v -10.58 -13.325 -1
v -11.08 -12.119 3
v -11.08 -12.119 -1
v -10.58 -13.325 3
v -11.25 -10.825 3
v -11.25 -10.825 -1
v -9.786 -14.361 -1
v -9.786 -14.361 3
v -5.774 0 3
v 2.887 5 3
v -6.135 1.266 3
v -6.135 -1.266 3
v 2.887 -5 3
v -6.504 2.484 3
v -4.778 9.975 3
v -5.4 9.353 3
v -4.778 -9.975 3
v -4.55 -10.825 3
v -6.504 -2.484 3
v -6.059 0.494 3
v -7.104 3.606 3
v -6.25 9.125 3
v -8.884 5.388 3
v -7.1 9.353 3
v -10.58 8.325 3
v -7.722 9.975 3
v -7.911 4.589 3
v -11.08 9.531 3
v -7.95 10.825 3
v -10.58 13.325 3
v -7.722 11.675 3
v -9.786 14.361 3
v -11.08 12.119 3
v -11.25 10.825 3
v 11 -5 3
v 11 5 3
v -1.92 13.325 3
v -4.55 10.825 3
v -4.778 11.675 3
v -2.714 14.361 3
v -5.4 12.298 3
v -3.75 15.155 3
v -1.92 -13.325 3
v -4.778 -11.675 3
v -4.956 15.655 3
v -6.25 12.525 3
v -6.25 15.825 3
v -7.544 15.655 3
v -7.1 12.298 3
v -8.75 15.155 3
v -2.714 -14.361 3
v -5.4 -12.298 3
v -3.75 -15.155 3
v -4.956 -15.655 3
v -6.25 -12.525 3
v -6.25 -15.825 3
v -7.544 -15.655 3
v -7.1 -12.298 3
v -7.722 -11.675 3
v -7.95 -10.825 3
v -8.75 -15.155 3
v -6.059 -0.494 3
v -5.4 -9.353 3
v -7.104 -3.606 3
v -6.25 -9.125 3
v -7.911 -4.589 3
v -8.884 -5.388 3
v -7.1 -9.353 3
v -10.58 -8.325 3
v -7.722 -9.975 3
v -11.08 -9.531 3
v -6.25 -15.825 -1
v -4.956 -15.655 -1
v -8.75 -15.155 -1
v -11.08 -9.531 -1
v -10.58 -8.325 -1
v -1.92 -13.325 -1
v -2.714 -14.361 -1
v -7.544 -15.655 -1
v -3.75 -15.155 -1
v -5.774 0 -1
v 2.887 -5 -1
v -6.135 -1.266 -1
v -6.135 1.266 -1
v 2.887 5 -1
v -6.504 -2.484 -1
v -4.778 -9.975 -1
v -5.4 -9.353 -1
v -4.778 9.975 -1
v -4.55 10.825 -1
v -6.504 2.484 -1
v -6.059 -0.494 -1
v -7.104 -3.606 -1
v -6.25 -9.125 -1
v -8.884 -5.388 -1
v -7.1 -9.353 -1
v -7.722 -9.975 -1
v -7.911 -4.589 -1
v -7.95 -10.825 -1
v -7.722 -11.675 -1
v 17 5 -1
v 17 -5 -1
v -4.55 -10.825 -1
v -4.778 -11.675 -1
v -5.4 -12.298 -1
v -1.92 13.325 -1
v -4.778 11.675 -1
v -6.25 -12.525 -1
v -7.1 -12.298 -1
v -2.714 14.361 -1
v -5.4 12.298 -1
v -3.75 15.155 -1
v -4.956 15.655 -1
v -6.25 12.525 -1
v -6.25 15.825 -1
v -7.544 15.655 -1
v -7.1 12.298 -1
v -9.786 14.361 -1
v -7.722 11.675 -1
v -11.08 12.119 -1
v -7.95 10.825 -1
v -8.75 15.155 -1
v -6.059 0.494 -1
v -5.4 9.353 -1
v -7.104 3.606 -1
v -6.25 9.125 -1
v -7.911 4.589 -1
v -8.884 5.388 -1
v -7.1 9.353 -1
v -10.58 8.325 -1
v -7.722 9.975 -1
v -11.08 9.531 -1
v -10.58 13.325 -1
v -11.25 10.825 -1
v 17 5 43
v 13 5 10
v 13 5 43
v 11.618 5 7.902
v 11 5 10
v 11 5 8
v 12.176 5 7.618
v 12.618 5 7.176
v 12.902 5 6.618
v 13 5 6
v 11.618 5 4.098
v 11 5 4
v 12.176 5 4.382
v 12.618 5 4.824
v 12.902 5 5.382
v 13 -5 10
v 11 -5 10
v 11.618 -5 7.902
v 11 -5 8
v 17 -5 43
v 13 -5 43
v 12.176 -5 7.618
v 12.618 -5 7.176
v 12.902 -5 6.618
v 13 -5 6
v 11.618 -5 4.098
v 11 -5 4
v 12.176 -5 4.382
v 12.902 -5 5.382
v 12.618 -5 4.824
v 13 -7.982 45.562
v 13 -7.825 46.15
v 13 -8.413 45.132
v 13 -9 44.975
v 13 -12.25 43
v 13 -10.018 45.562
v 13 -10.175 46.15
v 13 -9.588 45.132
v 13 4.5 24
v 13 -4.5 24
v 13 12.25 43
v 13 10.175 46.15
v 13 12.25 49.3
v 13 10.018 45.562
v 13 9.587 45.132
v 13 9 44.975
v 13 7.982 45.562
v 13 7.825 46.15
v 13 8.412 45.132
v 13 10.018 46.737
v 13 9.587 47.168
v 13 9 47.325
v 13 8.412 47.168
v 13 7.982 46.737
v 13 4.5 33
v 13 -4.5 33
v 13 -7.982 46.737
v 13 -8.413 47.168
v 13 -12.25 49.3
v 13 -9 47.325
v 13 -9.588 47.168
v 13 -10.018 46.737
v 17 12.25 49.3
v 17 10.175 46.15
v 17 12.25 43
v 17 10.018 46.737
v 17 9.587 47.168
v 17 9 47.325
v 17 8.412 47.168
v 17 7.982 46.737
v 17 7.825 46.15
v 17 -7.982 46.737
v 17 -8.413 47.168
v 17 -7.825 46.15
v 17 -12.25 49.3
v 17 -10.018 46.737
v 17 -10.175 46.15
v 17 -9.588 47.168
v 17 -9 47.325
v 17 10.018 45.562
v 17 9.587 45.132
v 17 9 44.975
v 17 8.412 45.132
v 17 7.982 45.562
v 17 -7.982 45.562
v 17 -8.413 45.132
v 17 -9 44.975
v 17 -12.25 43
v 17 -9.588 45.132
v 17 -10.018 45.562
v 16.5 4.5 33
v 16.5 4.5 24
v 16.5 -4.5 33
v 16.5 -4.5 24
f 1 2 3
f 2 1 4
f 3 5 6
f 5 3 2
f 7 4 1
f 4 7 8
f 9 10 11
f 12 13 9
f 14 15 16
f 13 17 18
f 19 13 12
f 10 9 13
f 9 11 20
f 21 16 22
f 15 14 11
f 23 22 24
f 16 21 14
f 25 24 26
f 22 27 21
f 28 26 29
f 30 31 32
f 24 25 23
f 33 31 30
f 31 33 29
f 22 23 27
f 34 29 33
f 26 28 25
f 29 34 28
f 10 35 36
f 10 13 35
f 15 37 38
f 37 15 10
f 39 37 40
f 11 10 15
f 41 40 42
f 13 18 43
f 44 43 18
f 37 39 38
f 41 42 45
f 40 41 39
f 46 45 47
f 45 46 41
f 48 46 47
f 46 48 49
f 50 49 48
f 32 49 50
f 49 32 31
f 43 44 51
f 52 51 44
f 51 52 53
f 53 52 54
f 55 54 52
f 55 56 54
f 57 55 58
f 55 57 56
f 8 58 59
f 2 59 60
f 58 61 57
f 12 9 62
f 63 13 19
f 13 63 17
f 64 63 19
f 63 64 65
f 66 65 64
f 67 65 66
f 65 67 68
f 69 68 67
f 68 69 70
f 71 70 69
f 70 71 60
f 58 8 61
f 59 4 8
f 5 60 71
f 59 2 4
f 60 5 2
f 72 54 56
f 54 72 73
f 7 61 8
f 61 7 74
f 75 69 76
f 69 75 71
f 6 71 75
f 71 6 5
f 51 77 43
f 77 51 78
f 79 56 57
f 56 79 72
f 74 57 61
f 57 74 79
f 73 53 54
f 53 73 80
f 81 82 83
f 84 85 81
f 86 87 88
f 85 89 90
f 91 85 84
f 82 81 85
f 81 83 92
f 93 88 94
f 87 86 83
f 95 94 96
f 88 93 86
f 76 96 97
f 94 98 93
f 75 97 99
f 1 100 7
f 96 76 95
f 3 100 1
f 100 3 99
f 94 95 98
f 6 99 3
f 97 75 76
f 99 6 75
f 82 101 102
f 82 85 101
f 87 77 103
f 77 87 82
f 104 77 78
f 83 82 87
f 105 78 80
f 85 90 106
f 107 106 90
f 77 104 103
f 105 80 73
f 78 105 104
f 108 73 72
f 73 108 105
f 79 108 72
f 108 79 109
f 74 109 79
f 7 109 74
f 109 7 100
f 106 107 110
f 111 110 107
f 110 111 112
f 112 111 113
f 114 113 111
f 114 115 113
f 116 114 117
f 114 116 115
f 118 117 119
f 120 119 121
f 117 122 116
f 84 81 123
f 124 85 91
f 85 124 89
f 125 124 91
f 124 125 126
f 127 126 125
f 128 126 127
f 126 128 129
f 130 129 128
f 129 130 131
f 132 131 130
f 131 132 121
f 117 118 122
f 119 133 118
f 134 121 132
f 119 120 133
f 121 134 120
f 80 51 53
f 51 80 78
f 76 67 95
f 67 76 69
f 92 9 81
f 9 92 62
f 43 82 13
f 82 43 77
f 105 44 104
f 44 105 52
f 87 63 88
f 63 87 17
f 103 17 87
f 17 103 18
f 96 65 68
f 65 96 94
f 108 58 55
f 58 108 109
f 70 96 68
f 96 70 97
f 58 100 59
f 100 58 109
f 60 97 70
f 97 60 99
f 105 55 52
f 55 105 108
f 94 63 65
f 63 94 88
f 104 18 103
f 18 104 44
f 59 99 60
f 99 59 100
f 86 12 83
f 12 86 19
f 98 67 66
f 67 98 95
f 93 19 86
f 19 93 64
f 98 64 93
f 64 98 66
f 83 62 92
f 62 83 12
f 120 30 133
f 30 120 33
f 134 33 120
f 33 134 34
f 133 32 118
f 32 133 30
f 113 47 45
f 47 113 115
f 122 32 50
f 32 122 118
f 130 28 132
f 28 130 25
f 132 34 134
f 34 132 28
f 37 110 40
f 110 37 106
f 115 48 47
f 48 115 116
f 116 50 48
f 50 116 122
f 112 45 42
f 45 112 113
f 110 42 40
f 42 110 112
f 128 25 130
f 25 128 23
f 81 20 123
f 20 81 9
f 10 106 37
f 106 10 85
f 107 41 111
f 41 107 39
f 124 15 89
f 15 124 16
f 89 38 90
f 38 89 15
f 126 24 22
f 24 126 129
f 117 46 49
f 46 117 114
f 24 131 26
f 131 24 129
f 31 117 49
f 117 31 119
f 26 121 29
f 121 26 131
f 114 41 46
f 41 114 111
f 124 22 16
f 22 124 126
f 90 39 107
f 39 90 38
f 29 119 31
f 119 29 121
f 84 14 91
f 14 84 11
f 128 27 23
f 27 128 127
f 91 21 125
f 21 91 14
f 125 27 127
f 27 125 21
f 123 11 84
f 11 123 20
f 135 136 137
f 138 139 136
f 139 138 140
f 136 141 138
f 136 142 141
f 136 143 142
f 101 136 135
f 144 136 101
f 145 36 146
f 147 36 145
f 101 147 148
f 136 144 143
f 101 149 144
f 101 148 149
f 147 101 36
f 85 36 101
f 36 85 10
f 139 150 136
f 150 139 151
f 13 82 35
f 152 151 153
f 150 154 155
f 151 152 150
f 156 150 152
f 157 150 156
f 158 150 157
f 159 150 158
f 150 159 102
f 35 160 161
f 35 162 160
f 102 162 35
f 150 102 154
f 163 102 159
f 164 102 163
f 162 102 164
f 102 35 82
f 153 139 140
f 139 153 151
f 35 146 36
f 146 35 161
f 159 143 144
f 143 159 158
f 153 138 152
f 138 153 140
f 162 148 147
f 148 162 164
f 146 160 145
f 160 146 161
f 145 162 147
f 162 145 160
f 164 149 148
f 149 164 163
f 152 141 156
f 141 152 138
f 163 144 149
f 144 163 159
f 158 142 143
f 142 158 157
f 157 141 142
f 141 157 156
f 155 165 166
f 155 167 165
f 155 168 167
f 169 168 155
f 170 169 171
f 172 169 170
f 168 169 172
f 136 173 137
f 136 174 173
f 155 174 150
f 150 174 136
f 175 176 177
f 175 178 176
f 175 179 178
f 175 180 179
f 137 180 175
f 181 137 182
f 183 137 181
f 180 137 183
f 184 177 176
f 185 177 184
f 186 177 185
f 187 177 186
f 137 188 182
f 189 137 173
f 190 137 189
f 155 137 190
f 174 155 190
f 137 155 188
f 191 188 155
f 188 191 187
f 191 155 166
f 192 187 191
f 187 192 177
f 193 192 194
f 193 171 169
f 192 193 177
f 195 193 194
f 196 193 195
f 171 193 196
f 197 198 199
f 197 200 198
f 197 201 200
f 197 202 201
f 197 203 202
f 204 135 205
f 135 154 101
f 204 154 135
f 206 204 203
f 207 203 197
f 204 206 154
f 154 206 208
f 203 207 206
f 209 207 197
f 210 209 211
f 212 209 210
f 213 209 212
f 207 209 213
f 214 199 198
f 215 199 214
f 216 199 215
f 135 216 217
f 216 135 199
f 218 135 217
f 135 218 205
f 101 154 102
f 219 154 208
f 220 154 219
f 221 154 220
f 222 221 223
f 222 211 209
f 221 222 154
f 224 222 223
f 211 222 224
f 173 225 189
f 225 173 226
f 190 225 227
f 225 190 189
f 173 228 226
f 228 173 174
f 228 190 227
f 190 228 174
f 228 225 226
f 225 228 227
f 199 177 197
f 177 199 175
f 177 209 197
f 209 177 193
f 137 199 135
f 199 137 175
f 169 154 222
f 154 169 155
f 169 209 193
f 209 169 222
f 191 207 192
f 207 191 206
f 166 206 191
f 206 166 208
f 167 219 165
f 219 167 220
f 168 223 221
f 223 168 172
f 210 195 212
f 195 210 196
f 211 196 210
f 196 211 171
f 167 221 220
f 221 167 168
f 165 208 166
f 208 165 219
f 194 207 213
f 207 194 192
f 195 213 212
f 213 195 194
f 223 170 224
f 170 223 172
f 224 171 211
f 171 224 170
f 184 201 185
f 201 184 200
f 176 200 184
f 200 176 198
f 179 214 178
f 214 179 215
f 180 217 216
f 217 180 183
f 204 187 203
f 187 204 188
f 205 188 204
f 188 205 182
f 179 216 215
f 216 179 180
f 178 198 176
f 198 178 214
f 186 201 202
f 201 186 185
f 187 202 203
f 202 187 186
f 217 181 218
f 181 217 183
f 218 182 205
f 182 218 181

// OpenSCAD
// file: configuration.scad
// Increase this if your slicer or printer make holes too tight.
extra_radius = 0; // 0.1;

// OD = outside diameter, corner to corner.
m3_nut_od = 6.1;
m3_nut_radius = m3_nut_od/2 + 0.2 + extra_radius;
m3_nut_h = 2.4;
m3_nyloc_h = 3.9;
m3_washer_radius = 3.5 + extra_radius;

m4_nut_od = 7.8;
m4_nut_radius = m4_nut_od/2 + 0.2 + extra_radius;
m4_washer_radius = 4.4 + extra_radius;

// Major diameter of metric 3mm thread.
m3_major = 3;
m3_radius = m3_major/2 + extra_radius;
m3_wide_radius = m3_major/2 + extra_radius + 0.2;

// Major diameter of metric 4mm thread.
m4_major = 4;
m4_radius = m4_major/2 + extra_radius;
m4_wide_radius = m4_major/2 + extra_radius + 0.2;

// M6 Radius
m6_radius = 6/2;

// No4 Self Tapper pilot hole radius
no4_pilot_radius = 2.35/2;

// NEMA17 stepper motors.
motor_shaft_diameter = 5;
motor_shaft_radius = motor_shaft_diameter/2 + extra_radius;

// Frame brackets. M3x8mm screws work best with 3.6 mm brackets.
thickness = 4.0; //3.6 on 1515

// OpenBeam or Misumi. Currently only 15x15 mm, but there is a plan
// to make models more parametric and allow 20x20 mm in the future.
extrusion = 20;

// Placement for the NEMA17 stepper motors.
motor_offset = 44;
motor_length = 47;

separation = 38;  // Distance between ball joint mounting faces.

extrusion_fin_d = 1;

vertex_radius = 40.5; //set to 36 for 1515
vertex_x_offset = 7.25; // offset of the horizontal extrusion to the vertical one in X axis
vertex_y_offset = 39 ;//27; // offset of the horizontal extrusion to the vertical one in Y axis
// main file
include <configuration.scad>;

height = 26;
height2 = 26;
tunnel = 2.4;
face_offset = 4;

module foot() {
  difference() {
    translate([12.5, 0, 0]) rotate([0, 0, -60])
      translate([-12.5, 0, 1]) rotate([0, 0, -60]) union() {
        cylinder(r=5, h=4, center=true, $fn=24);
        translate([10, 0, 0])
          cube([20, 10, 4], center=true);
    }
    translate([0, -10, 0])
      cube([40, 20, 20], center=true);
    translate([12.5, 0, 0]) {
      // Space for bowden push fit connector.
      cylinder(r=6.49, h=3*height, center=true, $fn=32);
      for (a = [60:120:359]) {
	    rotate([0, 0, a]) translate([-12.5, 0, 0])
          cylinder(r=m3_wide_radius, h=20, center=true, $fn=12);
      }
    }
  }
}

module ir_mount()
{
    difference()
    {
        cube([24.5,4,6.3]);
        translate([24.5/2-9,10,3.15])
            rotate([90,0,0])
                cylinder(r=no4_pilot_radius,h=20,$fn=12);
        translate([24.5/2+9,10,3.15])
            rotate([90,0,0])
                cylinder(r=no4_pilot_radius,h=20,$fn=12);
    }
}

module z_probe()
{
        union()
        {
            // Feet for vertical M3 screw attachment.
            rotate([0, 0, 90])
            {
                foot();
                scale([1, -1, 1])
                    foot();
            }
            // Cutout for threaded rod
            difference()
            {
                translate([0,-13,6])
                    cube([10,4,8],center=true);
                translate([-5,-11,6])
                    rotate([90,0,90])
                        cylinder(r=2,h=10,$fn=20);
            }
            // Right angled arm
            translate([-5,-17, -1])
            {
                
                cube([10, 17, 4]);
                difference()
                {
                    cube([10, 4, 40+5]);
                    translate([0.5,0.5,22-16.5+14.5+5])
                    {
                        // Cutout for pins on bottom of pcb
                        #cube([9,3.5,9]);
                    }
                }
            }
            translate([-12.25,-17, 38+5])
            {
                ir_mount();
                  
            }
        }
        

}

rotate([0,0,90])
    z_probe();
